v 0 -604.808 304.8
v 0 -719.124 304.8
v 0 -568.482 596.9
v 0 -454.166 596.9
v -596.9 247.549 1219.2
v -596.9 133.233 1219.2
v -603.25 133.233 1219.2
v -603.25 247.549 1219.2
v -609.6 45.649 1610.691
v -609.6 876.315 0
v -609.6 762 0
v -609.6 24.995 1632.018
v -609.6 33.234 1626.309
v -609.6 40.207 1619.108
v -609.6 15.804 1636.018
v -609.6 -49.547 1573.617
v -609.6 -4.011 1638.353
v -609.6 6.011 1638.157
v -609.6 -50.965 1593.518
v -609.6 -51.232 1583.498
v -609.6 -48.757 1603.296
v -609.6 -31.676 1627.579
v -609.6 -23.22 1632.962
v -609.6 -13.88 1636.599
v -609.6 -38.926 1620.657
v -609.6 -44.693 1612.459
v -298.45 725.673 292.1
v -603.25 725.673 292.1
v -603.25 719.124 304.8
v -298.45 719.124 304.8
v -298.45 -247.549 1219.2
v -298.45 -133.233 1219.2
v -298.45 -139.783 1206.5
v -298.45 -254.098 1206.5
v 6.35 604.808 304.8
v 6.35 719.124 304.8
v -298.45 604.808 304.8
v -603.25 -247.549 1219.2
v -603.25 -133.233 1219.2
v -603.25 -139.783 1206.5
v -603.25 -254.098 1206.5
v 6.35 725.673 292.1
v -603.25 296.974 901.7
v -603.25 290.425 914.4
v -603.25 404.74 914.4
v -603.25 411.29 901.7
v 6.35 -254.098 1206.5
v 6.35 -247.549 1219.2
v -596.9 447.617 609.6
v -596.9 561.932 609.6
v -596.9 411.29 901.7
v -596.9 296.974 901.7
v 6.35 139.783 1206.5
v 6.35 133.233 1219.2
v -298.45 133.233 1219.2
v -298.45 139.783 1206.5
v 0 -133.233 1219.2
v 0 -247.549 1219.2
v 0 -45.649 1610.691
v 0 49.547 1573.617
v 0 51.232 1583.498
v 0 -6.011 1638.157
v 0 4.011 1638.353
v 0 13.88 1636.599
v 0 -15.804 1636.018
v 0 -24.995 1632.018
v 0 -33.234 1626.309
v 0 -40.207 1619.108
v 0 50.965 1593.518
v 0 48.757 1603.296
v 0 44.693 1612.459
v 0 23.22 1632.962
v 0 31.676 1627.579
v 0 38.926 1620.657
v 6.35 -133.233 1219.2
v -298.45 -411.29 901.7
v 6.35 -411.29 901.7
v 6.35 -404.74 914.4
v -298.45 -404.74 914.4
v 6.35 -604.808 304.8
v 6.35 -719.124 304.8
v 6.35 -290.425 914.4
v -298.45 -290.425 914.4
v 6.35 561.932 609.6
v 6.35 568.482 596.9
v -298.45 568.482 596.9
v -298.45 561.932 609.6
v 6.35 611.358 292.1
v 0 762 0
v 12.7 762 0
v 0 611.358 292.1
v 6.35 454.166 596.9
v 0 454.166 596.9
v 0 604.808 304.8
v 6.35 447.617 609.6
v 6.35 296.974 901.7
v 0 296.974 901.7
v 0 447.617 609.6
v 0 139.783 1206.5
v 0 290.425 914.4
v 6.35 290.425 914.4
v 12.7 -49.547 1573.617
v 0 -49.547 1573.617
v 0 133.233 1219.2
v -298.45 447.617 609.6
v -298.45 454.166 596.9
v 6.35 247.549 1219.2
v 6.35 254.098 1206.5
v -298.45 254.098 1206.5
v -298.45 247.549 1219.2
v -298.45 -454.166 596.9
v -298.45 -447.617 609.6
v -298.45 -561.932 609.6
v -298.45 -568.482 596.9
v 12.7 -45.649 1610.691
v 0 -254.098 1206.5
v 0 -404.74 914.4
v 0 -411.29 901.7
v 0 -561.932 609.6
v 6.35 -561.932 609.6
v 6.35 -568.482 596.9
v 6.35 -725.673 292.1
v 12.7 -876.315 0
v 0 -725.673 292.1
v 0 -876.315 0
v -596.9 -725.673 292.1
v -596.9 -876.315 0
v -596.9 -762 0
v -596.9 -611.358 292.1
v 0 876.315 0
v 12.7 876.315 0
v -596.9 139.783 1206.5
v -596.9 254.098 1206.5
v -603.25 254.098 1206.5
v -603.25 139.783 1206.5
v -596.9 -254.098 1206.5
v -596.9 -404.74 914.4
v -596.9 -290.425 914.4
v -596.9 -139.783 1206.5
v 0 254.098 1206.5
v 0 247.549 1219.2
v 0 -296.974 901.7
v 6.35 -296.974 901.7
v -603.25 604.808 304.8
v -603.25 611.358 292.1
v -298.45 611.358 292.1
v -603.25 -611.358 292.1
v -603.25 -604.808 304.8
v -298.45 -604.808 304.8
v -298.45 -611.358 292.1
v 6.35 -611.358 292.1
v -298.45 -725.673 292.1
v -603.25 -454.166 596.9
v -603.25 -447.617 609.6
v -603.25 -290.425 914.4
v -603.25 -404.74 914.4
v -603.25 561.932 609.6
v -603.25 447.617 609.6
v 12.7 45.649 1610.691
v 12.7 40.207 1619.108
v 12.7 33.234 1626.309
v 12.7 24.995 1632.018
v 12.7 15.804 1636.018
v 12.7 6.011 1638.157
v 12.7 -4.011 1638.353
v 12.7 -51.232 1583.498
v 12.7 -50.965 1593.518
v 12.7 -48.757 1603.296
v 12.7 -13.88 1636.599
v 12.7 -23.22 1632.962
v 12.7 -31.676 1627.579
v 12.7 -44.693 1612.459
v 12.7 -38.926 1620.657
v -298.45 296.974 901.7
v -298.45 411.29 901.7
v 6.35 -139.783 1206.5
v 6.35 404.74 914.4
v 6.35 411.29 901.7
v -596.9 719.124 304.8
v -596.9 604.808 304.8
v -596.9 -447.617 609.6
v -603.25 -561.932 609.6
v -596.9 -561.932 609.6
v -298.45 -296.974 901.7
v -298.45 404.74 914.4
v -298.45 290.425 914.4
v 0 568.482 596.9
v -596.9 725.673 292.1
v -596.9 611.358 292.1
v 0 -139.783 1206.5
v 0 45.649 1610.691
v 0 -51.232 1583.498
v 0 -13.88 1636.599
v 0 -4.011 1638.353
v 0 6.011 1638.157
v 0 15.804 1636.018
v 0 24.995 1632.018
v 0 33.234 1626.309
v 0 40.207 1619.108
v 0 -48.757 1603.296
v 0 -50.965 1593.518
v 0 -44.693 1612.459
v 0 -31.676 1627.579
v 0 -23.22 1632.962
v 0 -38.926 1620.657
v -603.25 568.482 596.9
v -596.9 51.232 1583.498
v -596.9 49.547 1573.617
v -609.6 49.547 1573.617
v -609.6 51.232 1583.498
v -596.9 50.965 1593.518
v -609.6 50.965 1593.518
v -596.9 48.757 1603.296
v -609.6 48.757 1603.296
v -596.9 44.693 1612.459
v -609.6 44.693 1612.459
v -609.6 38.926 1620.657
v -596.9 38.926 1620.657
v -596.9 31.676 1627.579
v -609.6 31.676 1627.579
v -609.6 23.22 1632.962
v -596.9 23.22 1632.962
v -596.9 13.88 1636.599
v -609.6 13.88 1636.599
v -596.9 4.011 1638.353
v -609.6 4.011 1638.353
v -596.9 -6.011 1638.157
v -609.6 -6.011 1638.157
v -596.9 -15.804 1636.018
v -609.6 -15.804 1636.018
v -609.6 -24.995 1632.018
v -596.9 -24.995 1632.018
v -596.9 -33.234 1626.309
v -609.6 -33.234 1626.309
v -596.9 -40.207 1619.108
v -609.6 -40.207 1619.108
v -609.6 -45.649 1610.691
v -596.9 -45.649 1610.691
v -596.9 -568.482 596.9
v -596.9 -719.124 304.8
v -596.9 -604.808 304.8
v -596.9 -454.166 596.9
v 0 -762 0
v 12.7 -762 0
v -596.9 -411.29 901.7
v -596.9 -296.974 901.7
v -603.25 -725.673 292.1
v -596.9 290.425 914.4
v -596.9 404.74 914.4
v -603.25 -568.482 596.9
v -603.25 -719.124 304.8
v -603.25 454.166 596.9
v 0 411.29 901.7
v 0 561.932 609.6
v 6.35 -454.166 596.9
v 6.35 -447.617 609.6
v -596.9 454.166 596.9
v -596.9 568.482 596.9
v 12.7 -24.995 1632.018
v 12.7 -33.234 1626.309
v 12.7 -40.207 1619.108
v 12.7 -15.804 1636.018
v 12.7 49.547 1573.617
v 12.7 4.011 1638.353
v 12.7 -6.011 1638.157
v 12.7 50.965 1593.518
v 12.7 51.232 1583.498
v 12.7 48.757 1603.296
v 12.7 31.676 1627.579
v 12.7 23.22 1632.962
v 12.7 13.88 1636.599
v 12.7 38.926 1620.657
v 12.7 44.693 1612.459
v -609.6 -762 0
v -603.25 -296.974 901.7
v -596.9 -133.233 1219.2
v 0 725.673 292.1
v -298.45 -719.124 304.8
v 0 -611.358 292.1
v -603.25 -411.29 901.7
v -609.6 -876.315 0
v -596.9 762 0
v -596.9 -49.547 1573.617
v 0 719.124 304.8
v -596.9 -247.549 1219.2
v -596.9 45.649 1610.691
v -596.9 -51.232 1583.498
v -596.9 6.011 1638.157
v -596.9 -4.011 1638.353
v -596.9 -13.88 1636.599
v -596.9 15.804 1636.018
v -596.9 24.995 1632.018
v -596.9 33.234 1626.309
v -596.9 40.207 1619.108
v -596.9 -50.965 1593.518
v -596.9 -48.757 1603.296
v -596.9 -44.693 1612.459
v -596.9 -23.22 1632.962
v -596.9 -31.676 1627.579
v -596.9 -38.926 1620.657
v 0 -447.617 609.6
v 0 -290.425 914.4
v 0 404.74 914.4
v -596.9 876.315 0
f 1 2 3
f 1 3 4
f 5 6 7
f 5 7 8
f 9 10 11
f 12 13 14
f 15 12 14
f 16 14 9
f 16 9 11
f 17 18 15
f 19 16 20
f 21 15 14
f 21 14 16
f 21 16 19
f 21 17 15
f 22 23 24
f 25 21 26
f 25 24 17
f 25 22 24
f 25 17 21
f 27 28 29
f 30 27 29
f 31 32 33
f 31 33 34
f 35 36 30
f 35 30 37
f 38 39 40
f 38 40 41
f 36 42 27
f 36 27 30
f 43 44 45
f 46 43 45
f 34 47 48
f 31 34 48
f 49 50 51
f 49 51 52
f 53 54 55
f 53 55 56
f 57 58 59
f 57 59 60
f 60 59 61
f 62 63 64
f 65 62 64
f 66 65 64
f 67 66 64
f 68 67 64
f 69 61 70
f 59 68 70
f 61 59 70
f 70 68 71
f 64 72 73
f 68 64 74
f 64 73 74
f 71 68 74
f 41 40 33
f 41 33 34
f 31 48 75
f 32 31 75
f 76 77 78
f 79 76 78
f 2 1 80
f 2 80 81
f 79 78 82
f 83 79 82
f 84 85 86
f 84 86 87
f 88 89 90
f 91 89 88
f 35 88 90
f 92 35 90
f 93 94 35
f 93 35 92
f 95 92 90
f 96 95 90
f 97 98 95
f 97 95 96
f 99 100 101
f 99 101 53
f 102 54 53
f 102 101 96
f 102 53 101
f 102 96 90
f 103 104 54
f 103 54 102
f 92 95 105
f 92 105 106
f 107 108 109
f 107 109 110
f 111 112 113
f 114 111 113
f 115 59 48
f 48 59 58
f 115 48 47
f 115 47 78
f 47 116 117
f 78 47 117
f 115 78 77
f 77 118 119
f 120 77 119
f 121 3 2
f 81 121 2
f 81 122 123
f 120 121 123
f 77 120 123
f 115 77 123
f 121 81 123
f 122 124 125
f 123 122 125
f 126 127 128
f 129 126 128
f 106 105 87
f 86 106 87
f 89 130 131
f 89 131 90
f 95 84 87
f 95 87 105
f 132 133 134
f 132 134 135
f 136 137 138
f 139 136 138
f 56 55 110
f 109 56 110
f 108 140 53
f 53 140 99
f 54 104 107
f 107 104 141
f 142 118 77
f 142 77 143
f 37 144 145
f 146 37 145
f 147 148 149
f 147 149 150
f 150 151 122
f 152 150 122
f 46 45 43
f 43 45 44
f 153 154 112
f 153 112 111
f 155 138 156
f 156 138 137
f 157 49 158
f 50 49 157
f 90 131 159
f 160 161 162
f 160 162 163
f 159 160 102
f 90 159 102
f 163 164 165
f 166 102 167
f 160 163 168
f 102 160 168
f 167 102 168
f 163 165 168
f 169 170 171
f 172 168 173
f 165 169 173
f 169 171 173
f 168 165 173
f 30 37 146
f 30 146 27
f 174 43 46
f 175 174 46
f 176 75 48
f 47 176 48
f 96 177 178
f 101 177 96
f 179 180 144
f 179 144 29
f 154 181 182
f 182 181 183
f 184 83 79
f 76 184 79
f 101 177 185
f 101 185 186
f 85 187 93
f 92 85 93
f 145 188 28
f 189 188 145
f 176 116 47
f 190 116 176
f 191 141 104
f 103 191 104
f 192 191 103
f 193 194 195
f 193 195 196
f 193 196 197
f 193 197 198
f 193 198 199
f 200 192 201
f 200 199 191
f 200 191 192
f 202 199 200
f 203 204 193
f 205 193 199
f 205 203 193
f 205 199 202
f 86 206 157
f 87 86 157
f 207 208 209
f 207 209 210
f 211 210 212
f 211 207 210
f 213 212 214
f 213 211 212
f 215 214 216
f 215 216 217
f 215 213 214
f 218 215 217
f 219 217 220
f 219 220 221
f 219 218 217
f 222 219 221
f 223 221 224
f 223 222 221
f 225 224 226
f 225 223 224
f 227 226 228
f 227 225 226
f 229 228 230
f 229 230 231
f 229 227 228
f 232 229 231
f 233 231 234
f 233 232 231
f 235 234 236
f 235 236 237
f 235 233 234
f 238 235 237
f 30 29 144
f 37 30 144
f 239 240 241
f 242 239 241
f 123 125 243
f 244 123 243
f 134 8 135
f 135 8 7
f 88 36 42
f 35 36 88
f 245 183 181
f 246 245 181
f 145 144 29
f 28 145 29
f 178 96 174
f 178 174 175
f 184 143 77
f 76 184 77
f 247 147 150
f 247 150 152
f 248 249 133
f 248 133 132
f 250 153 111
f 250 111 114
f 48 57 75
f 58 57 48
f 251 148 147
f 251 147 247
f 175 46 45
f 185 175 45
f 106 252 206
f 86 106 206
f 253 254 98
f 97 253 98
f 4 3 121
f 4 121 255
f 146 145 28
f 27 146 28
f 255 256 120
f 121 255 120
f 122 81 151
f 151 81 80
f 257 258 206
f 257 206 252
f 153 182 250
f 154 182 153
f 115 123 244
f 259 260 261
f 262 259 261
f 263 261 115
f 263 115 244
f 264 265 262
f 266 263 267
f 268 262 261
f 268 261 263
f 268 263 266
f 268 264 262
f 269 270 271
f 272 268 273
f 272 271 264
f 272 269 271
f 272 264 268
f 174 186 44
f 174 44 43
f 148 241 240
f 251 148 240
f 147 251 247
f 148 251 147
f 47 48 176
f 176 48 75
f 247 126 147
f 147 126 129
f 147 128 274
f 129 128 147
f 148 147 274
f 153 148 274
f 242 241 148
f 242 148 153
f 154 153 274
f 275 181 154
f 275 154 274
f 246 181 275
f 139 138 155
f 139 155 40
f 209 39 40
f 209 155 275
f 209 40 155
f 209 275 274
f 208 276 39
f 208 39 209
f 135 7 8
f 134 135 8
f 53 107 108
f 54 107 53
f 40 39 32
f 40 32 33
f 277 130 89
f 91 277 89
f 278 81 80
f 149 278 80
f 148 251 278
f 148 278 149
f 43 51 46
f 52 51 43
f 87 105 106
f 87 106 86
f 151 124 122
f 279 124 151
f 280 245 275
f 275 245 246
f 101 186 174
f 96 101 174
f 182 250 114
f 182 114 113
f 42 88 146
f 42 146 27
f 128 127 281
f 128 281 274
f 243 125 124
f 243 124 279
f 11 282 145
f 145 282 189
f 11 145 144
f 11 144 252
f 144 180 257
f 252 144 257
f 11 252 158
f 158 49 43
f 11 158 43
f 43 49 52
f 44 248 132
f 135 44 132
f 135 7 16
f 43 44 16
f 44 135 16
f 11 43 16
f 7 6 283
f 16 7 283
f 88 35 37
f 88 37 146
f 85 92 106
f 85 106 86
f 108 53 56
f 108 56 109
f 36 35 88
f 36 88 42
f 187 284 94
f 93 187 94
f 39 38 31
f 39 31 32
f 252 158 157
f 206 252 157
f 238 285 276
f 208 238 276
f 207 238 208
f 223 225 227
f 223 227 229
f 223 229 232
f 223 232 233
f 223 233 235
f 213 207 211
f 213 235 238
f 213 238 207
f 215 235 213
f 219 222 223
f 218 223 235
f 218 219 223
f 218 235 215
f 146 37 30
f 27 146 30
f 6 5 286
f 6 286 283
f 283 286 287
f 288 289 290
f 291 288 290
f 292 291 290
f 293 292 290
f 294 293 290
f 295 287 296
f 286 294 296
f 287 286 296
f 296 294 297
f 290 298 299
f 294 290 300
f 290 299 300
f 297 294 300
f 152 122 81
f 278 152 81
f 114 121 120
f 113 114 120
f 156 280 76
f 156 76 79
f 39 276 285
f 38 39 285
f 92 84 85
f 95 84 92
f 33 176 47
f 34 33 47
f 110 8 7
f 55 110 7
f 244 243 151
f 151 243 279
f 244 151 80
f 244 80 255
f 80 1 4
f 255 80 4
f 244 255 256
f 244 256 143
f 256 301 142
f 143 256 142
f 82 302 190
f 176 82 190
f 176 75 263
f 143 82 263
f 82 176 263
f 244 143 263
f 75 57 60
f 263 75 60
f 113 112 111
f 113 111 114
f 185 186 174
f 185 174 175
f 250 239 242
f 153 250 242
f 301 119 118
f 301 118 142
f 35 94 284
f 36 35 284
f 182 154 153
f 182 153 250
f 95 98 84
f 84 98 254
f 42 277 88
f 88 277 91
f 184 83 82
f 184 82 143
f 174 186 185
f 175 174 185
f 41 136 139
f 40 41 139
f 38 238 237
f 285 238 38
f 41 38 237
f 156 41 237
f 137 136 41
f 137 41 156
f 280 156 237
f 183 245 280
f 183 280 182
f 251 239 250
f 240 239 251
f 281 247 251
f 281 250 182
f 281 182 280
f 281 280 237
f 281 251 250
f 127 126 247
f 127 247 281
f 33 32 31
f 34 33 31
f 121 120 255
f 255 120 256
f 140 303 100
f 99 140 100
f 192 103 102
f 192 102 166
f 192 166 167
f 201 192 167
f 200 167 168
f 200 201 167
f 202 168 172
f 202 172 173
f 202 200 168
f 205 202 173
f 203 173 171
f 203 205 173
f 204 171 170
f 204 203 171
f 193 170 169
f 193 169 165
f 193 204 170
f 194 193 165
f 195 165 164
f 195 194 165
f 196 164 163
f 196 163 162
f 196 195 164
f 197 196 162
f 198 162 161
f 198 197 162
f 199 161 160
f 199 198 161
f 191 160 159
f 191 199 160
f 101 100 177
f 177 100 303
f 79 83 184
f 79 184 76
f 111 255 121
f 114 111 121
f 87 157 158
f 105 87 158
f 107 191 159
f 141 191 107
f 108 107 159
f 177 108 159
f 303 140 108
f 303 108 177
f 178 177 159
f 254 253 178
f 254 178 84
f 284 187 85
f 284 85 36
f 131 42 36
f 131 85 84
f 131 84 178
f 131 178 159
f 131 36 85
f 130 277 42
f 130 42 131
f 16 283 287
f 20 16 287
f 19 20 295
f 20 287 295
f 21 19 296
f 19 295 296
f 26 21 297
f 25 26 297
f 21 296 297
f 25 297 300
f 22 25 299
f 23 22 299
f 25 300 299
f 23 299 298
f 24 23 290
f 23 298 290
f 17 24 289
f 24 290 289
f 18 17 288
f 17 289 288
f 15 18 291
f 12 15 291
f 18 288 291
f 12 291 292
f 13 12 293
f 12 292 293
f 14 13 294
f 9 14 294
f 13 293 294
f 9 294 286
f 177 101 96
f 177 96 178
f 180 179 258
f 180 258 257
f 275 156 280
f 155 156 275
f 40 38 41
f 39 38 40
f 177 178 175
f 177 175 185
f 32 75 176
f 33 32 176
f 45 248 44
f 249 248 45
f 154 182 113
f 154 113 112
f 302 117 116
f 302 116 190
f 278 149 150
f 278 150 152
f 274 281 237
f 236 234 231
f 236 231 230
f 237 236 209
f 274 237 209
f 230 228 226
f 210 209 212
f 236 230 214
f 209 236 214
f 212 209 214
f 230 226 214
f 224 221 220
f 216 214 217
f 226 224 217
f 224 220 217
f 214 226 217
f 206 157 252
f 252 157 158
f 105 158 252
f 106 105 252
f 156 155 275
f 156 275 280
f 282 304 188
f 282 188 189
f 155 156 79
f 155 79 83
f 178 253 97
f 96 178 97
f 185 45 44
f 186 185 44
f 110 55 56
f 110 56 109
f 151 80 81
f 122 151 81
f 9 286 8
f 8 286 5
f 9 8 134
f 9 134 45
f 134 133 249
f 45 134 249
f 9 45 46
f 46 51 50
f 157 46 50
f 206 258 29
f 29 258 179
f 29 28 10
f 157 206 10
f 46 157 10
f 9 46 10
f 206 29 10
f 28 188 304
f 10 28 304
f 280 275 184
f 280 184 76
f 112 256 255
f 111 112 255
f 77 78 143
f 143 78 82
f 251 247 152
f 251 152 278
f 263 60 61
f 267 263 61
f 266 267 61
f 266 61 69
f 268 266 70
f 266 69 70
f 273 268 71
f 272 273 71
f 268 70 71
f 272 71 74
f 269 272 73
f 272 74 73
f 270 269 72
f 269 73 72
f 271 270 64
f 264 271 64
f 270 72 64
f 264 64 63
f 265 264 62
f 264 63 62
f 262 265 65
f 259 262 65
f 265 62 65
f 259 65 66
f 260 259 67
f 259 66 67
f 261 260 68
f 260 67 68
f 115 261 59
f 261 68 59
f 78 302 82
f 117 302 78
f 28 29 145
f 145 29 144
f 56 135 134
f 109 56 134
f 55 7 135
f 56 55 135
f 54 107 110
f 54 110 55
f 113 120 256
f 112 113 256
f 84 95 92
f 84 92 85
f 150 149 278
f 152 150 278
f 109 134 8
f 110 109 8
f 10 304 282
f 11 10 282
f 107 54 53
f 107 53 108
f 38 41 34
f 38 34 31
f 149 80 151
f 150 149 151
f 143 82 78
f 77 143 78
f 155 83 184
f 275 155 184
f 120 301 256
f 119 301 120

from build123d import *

# Parameters (mm, degrees)
F1_DEPTH = 12.7
F3_DEPTH = 6.35
F5_DEPTH = 304.8


with BuildPart() as f1:
    # F0 (on Right) → F1 (new body)
    with BuildSketch(Plane.YZ):
        with BuildLine():
            Line((-45.6487136165, 1610.6905428261), (-876.3154893977, 0))
            Line((-876.3154893977, 0), (-762, 0))
            Line((-762, 0), (49.5472886649, 1573.6172205508))
            ThreePointArc((49.5472886649, 1573.6172205508), (18.6388714246, 1635.0090014768), (-45.6487136165, 1610.6905428261))
        make_face()
    extrude(amount=F1_DEPTH)

    # F2 (on face) → F3 (cut)
    with BuildSketch(Plane.YZ):
        Polygon((-133.233079164, 1219.2), (-247.5485685617, 1219.2), (-254.098223987, 1206.5), (-139.7827345893, 1206.5), align=None)
        Polygon((-290.424809373, 914.4), (-404.7402987707, 914.4), (-411.289954196, 901.7), (-296.9744647984, 901.7), align=None)
        Polygon((-447.616539582, 609.6), (-561.9320289797, 609.6), (-568.4816844051, 596.9), (-454.1661950074, 596.9), align=None)
        Polygon((-604.808269791, 304.8), (-719.1237591887, 304.8), (-725.6734146141, 292.1), (-611.3579252164, 292.1), align=None)
    extrude(amount=F3_DEPTH, mode=Mode.SUBTRACT)


with BuildPart() as f5:
    # F4 (on face) → F5 (new body)
    with BuildSketch(Plane(origin=(6.35, 0, 0), x_dir=(0, -1, 0), z_dir=(-1, 0, 0))):
        Polygon((254.098223987, 1206.5), (247.5485685617, 1219.2), (133.233079164, 1219.2), (139.7827345893, 1206.5), align=None)
    extrude(amount=F5_DEPTH)


with BuildPart() as f5b:
    # F4 (on face) → F5, piece 2 (new body)
    with BuildSketch(Plane(origin=(6.35, 0, 0), x_dir=(0, -1, 0), z_dir=(-1, 0, 0))):
        Polygon((725.6734146141, 292.1), (719.1237591887, 304.8), (604.808269791, 304.8), (611.3579252164, 292.1), align=None)
    extrude(amount=F5_DEPTH)


with BuildPart() as f5c:
    # F4 (on face) → F5, piece 3 (new body)
    with BuildSketch(Plane(origin=(6.35, 0, 0), x_dir=(0, -1, 0), z_dir=(-1, 0, 0))):
        Polygon((568.4816844051, 596.9), (561.9320289797, 609.6), (447.616539582, 609.6), (454.1661950074, 596.9), align=None)
    extrude(amount=F5_DEPTH)


with BuildPart() as f5d:
    # F4 (on face) → F5, piece 4 (new body)
    with BuildSketch(Plane(origin=(6.35, 0, 0), x_dir=(0, -1, 0), z_dir=(-1, 0, 0))):
        Polygon((411.289954196, 901.7), (404.7402987707, 914.4), (290.424809373, 914.4), (296.9744647984, 901.7), align=None)
    extrude(amount=F5_DEPTH)


with BuildPart() as f6_1:
    # F6: instance of F1
    add(f1.part.mirror(Plane(origin=(-298.45, -193.6656515755, 1212.85), x_dir=(0, -1, 0), z_dir=(-1, 0, 0))))


with BuildPart() as f6_2:
    # F6: instance of F5
    add(f5.part.mirror(Plane(origin=(-298.45, -193.6656515755, 1212.85), x_dir=(0, -1, 0), z_dir=(-1, 0, 0))))


with BuildPart() as f6_3:
    # F6: instance of F5d
    add(f5d.part.mirror(Plane(origin=(-298.45, -193.6656515755, 1212.85), x_dir=(0, -1, 0), z_dir=(-1, 0, 0))))


with BuildPart() as f6_4:
    # F6: instance of F5c
    add(f5c.part.mirror(Plane(origin=(-298.45, -193.6656515755, 1212.85), x_dir=(0, -1, 0), z_dir=(-1, 0, 0))))


with BuildPart() as f6_5:
    # F6: instance of F5b
    add(f5b.part.mirror(Plane(origin=(-298.45, -193.6656515755, 1212.85), x_dir=(0, -1, 0), z_dir=(-1, 0, 0))))


with BuildPart() as f7_1:
    # F7: instance of F1
    add(f1.part.mirror(Plane.XZ))


with BuildPart() as f7_2:
    # F7: instance of F6_1
    add(f6_1.part.mirror(Plane.XZ))


with BuildPart() as f7_3:
    # F7: instance of F6_2
    add(f6_2.part.mirror(Plane.XZ))


with BuildPart() as f7_4:
    # F7: instance of F5
    add(f5.part.mirror(Plane.XZ))


with BuildPart() as f7_5:
    # F7: instance of F5d
    add(f5d.part.mirror(Plane.XZ))


with BuildPart() as f7_6:
    # F7: instance of F5c
    add(f5c.part.mirror(Plane.XZ))


with BuildPart() as f7_7:
    # F7: instance of F5b
    add(f5b.part.mirror(Plane.XZ))


with BuildPart() as f7_8:
    # F7: instance of F6_3
    add(f6_3.part.mirror(Plane.XZ))


with BuildPart() as f7_9:
    # F7: instance of F6_4
    add(f6_4.part.mirror(Plane.XZ))


with BuildPart() as f7_10:
    # F7: instance of F6_5
    add(f6_5.part.mirror(Plane.XZ))


solid = Compound([f1.part, f5.part, f5b.part, f5c.part, f5d.part, f6_1.part, f6_2.part, f6_3.part, f6_4.part, f6_5.part, f7_1.part, f7_2.part, f7_3.part, f7_4.part, f7_5.part, f7_6.part, f7_7.part, f7_8.part, f7_9.part, f7_10.part])
